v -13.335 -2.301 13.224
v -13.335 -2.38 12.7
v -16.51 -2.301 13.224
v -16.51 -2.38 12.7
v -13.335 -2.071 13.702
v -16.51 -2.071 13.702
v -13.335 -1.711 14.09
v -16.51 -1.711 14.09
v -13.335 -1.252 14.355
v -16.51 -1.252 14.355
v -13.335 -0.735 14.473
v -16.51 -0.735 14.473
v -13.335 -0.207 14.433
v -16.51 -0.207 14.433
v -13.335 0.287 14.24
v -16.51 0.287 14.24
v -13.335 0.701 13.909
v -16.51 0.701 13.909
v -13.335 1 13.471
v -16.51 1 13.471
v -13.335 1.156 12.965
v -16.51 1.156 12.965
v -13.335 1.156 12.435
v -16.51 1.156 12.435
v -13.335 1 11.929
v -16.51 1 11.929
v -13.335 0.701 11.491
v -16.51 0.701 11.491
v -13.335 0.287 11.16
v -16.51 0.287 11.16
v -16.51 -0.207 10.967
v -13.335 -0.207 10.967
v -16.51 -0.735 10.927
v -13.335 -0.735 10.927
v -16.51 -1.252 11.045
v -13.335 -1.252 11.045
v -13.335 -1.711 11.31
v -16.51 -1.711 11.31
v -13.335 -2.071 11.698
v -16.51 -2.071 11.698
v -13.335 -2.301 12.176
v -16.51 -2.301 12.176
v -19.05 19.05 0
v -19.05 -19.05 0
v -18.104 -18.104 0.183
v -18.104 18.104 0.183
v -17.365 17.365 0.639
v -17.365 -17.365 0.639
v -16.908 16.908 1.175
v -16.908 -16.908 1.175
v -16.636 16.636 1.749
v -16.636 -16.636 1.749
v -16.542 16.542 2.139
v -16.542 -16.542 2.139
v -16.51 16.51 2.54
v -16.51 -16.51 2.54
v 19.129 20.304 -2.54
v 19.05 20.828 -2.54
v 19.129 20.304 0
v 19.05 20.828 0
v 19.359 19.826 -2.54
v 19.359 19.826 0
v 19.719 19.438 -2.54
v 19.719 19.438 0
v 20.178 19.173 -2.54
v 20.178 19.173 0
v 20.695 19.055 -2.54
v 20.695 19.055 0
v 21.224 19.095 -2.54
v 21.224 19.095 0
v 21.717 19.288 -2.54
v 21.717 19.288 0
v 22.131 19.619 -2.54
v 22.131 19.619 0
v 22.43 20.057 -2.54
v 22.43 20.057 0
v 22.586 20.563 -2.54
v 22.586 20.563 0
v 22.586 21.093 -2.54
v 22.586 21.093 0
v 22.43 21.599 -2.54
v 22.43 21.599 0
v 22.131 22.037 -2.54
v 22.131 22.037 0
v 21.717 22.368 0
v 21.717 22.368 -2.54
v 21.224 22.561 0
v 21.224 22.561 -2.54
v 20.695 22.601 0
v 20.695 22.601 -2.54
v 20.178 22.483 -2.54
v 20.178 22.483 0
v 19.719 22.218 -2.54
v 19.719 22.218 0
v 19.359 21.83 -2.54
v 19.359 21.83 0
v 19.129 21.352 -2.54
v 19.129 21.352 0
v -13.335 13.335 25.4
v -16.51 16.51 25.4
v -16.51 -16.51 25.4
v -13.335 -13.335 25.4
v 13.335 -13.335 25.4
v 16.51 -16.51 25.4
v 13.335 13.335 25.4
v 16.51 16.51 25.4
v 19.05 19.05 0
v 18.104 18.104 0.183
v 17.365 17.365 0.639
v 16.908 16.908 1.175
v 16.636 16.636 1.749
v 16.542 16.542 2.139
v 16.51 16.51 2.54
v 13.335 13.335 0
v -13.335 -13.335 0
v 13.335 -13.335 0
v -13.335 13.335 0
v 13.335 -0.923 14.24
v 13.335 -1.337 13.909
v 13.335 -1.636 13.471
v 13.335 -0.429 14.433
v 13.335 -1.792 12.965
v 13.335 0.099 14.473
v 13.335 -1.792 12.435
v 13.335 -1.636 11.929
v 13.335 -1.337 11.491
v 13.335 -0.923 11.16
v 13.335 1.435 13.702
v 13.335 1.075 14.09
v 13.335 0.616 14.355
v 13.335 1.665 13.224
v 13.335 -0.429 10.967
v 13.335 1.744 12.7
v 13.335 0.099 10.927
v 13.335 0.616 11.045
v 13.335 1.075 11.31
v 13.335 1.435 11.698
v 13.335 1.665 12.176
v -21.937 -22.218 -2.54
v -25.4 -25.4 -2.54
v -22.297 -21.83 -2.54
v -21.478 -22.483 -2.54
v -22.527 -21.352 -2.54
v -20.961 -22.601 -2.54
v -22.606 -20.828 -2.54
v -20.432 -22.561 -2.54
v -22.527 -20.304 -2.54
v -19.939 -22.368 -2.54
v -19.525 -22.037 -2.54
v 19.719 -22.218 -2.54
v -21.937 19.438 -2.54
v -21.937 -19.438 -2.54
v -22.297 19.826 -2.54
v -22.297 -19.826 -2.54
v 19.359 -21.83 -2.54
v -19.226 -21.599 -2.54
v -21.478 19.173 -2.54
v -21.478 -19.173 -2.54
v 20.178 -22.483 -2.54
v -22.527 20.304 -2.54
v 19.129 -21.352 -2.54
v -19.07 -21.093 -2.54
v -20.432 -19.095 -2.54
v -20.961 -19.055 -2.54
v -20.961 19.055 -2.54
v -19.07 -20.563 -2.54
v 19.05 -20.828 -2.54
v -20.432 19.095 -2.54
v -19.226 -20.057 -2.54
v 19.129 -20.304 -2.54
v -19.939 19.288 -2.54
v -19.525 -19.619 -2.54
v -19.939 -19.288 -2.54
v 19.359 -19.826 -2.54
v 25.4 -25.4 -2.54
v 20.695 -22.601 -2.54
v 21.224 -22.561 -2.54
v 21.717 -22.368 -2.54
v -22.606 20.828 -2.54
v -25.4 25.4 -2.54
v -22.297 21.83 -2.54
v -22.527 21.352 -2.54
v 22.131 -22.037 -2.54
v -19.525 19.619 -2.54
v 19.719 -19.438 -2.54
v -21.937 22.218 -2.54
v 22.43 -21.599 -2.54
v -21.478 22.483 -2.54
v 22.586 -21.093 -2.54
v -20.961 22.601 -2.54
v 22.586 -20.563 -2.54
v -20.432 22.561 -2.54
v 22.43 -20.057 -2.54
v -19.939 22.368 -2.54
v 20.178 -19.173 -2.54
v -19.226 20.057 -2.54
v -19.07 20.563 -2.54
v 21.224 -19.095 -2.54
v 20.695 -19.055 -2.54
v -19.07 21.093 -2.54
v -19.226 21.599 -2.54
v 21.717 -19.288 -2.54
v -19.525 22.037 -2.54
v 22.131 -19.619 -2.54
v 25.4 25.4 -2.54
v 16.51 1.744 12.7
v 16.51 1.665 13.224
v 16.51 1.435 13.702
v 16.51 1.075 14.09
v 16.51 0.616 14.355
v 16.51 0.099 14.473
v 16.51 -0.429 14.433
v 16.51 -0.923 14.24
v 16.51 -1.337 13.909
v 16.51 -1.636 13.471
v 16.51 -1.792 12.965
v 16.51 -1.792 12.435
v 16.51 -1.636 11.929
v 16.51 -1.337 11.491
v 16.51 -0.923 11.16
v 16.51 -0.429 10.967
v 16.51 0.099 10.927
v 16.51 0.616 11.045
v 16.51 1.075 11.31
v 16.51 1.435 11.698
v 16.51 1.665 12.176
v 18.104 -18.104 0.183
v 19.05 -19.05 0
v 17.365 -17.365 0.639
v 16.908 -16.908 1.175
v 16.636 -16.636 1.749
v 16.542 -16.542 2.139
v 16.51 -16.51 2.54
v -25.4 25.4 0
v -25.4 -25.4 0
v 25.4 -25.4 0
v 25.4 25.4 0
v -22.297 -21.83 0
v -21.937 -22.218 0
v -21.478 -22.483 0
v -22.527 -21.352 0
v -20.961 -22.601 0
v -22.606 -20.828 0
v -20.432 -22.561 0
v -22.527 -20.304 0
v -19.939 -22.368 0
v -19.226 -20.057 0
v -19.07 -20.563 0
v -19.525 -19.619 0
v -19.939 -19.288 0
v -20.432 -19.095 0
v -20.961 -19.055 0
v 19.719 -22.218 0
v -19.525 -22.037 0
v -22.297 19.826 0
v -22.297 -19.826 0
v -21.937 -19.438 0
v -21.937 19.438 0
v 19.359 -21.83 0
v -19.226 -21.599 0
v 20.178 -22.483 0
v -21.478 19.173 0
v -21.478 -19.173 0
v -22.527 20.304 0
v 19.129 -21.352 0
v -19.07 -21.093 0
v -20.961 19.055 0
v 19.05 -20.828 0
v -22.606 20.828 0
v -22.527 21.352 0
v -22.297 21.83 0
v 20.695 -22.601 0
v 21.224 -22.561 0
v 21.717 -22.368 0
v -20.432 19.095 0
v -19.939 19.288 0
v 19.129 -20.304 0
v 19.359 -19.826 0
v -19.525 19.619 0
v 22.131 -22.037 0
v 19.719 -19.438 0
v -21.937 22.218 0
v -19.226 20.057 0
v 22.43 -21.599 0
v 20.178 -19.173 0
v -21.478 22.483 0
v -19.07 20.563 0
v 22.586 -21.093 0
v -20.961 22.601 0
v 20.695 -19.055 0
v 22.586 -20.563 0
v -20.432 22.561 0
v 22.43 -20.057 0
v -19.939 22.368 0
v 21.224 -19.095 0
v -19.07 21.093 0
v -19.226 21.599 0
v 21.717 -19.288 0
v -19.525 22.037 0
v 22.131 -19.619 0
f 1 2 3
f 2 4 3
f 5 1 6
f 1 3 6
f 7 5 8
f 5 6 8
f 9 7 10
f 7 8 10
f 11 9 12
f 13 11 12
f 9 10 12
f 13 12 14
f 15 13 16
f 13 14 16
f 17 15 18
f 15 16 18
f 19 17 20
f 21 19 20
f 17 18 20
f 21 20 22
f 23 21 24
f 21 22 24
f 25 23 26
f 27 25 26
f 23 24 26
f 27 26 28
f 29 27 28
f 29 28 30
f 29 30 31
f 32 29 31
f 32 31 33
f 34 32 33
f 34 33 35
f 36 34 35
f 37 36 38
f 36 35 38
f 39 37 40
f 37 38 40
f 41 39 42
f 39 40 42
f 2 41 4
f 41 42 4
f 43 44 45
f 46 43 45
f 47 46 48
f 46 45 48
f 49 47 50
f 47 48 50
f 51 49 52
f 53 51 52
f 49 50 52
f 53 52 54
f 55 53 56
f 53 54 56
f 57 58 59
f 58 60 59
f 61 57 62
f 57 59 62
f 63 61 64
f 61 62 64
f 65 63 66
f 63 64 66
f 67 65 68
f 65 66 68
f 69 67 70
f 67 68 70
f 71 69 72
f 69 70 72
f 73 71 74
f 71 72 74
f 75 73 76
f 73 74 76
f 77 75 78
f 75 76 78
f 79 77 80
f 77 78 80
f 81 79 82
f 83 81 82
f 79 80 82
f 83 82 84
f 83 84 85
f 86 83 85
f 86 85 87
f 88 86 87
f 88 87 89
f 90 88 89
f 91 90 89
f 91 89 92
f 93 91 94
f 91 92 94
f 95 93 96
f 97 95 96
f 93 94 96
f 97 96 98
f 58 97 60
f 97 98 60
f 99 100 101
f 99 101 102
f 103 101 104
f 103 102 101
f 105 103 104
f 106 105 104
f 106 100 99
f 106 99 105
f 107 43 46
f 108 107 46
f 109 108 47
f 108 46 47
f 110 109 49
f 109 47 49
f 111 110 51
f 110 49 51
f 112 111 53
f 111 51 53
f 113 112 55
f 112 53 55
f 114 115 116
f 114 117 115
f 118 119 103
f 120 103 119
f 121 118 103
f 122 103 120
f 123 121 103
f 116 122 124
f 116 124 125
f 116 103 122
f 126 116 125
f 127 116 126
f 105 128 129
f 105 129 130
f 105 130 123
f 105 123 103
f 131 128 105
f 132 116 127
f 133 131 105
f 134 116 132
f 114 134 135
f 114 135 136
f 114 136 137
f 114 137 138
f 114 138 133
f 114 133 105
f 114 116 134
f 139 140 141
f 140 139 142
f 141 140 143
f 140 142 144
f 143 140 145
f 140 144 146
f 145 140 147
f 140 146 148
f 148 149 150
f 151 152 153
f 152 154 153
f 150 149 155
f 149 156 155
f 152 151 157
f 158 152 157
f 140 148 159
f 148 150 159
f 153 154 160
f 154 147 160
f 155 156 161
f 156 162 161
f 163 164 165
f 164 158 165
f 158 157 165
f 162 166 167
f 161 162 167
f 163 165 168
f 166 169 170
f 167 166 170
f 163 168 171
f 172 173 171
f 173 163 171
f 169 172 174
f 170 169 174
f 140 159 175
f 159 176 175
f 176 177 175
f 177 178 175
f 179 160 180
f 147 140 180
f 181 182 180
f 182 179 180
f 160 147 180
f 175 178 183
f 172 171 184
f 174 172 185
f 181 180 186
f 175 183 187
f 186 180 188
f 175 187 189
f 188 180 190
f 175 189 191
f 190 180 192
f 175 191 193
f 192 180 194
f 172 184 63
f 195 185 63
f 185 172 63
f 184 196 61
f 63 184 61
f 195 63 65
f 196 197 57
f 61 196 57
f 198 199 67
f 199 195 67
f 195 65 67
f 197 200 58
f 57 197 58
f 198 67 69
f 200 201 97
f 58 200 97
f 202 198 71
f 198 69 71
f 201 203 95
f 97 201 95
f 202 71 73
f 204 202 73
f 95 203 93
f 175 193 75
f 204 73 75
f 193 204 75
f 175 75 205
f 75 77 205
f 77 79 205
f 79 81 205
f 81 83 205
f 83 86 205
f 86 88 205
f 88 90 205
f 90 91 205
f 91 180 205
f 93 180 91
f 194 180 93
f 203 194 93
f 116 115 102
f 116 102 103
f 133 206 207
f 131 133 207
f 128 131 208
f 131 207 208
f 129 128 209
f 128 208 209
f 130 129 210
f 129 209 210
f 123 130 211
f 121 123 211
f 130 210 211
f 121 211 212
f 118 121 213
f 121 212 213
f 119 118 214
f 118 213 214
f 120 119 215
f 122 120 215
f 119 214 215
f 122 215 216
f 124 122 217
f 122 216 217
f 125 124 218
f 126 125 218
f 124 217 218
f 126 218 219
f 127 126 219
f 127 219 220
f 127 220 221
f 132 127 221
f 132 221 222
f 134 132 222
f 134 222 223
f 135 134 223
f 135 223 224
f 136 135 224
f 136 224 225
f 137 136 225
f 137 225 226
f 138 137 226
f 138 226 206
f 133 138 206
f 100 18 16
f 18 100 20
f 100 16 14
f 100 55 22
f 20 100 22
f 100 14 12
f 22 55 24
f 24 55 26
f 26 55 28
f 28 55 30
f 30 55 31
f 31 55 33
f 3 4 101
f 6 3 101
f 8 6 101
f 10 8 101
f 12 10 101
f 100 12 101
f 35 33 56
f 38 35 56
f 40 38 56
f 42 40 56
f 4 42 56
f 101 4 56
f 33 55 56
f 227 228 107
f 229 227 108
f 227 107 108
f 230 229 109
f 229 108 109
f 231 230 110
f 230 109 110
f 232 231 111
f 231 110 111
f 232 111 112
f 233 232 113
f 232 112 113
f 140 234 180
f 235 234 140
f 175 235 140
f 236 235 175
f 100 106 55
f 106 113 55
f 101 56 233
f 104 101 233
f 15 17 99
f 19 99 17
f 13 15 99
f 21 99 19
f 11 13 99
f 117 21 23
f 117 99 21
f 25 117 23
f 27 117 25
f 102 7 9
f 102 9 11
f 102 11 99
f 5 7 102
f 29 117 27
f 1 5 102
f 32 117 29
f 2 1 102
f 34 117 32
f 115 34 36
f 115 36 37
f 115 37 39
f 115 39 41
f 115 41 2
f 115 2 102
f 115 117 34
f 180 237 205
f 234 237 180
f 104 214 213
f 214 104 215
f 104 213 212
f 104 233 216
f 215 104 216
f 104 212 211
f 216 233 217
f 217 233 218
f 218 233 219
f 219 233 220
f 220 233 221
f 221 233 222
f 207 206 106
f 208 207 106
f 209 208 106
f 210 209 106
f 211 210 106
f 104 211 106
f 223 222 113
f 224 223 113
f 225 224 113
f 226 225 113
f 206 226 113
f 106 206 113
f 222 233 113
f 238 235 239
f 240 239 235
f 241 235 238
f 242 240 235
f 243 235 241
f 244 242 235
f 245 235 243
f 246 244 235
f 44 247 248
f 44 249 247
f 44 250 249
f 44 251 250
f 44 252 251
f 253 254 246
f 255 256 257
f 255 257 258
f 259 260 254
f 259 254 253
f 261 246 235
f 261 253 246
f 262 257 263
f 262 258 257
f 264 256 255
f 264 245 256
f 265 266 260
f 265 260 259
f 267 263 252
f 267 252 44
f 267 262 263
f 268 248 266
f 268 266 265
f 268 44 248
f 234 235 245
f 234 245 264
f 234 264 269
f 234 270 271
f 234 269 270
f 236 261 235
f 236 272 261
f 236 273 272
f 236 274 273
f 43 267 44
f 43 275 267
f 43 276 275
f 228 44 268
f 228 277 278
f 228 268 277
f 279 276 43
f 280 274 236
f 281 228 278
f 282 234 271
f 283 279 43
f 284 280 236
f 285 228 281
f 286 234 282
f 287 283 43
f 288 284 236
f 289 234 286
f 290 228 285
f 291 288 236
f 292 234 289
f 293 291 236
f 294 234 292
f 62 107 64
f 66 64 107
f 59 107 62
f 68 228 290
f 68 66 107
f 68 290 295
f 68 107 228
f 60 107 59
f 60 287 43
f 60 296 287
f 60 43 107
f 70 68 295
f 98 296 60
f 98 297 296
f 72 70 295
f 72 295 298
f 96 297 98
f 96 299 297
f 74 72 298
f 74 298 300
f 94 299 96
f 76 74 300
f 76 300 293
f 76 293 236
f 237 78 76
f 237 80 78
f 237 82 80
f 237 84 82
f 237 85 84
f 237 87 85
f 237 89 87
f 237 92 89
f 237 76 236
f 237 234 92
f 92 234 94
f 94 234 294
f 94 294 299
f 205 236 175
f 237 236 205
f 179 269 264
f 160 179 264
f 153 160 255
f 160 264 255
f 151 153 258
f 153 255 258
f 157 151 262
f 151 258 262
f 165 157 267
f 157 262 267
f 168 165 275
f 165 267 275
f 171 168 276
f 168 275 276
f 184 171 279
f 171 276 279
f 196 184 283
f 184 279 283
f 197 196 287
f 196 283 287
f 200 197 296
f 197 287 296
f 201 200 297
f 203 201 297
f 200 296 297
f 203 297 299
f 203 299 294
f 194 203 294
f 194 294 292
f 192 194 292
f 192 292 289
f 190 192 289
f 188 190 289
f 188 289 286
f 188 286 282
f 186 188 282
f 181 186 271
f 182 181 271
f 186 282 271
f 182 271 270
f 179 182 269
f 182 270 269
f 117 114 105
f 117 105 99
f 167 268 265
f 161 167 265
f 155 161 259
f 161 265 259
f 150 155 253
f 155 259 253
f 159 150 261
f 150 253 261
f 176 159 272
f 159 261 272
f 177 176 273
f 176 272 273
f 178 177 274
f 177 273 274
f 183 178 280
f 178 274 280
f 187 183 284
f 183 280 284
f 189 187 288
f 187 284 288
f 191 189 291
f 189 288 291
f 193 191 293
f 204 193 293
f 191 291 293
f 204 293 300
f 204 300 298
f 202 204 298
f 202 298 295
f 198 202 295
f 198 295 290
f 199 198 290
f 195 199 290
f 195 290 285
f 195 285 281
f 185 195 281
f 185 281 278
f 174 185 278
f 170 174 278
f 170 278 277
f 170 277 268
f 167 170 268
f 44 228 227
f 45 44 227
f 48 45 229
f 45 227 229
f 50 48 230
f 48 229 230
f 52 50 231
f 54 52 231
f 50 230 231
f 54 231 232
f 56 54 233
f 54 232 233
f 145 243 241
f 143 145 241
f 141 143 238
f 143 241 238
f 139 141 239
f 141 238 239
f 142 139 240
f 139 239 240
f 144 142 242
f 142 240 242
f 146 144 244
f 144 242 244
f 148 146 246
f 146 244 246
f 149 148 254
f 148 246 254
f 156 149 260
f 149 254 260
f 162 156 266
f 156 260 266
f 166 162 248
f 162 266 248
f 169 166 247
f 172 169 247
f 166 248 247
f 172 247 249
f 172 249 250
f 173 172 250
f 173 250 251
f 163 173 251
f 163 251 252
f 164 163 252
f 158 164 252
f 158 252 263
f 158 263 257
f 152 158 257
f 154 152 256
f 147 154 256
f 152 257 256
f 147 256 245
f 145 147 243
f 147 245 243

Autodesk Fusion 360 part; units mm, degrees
sketch "Sketch1" plane through (0, 0, 0) normal (0, 0, 1) x (1, 0, 0)
  line L0 (13.335, 13.335) -> (-13.335, 13.335)
  line L1 (-13.335, 13.335) -> (-13.335, -13.335)
  line L2 (-13.335, -13.335) -> (13.335, -13.335)
  line L3 (13.335, -13.335) -> (13.335, 13.335)
  line L4 (13.335, 13.335) -> (-13.335, -13.335) construction
  line L5 (-13.335, 13.335) -> (13.335, -13.335) construction
  line L6 (16.51, 16.51) -> (-16.51, 16.51)
  line L7 (-16.51, 16.51) -> (-16.51, -16.51)
  line L8 (-16.51, -16.51) -> (16.51, -16.51)
  line L9 (16.51, -16.51) -> (16.51, 16.51)
  line L10 (16.51, 16.51) -> (-16.51, -16.51) construction
  line L11 (-16.51, 16.51) -> (16.51, -16.51) construction
  dimension "d1" = 26.67
  dimension "d2" = 26.67
  dimension "d3" = 33.02
  dimension "d4" = 33.02
extrude "Extrude1" add sketch "Sketch1" along normal blind 25.4
sketch "Sketch2" plane through (0, 0, 0) normal (0, 0, 1) x (1, 0, 0)
  line L0 (25.4, 25.4) -> (-25.4, 25.4)
  line L1 (-25.4, 25.4) -> (-25.4, -25.4)
  line L2 (-25.4, -25.4) -> (25.4, -25.4)
  line L3 (25.4, -25.4) -> (25.4, 25.4)
  line L4 (25.4, 25.4) -> (-25.4, -25.4) construction
  line L5 (-25.4, 25.4) -> (25.4, -25.4) construction
  dimension "d7" = 50.8
  dimension "d8" = 50.8
extrude "Extrude2" add sketch "Sketch2" against normal blind 2.54
fillet "Fillet1" radius 2.54 4 edges at (16.51, 0, 0) (0, -16.51, 0) (-16.51, 0, 0) (0, 16.51, 0)
sketch "Sketch4" plane through (0, 0, 0) normal (0, 0, 1) x (-1, 0, 0)
  line L0 (-25.4, 25.4) -> (-25.4, -25.4)
  line L1 (-25.4, -25.4) -> (25.4, -25.4)
  line L2 (25.4, -25.4) -> (25.4, 25.4)
  line L3 (25.4, 25.4) -> (-25.4, 25.4)
  line L4 (-19.05, -19.05) -> (-19.05, 19.05)
  line L5 (-19.05, 19.05) -> (19.05, 19.05)
  line L6 (19.05, 19.05) -> (19.05, -19.05)
  line L7 (19.05, -19.05) -> (-19.05, -19.05)
  circle A0 centre (20.828, -20.828) radius 1.778
  circle A1 centre (-20.828, -20.828) radius 1.778
  circle A2 centre (20.828, 20.828) radius 1.778
  circle A3 centre (-20.828, 20.828) radius 1.778
  dimension "d14" = 3.556
  dimension "d15" = 3.556
  dimension "d16" = 3.556
  dimension "d17" = 3.556
  dimension "d18" = 4.572
  dimension "d19" = 4.572
  dimension "d20" = 4.572
  dimension "d21" = 4.572
  dimension "d22" = 4.572
  dimension "d23" = 4.572
  dimension "d25" = 4.572
  dimension "d41" = 4.572
extrude "Extrude3" cut sketch "Sketch4" against normal blind 2.54 contours A0 | A1 | A2 | A3
sketch "Sketch5" plane through (-16.51, 0, 0) normal (-1, 0, 0) x (0, -1, 0)
  line L0 (-16.51, 2.54) -> (16.51, 2.54)
  line L1 (16.51, 2.54) -> (16.51, 25.4)
  line L2 (16.51, 25.4) -> (-16.51, 25.4)
  line L3 (-16.51, 25.4) -> (-16.51, 2.54)
  circle A0 centre (0.6022, 12.7) radius 1.778
  dimension "d28" = 3.556
  dimension "d29" = 12.7
  dimension "d30" = 15.9078
extrude "Extrude4" cut sketch "Sketch5" against normal blind 5.08 contours A0
sketch "Sketch7" plane through (16.51, 0, 0) normal (1, 0, 0) x (0, 1, 0)
  line L0 (-16.51, 2.54) -> (16.51, 2.54)
  line L1 (16.51, 2.54) -> (16.51, 25.4)
  line L2 (16.51, 25.4) -> (-16.51, 25.4)
  line L3 (-16.51, 25.4) -> (-16.51, 2.54)
  circle A0 centre (-0.0337, 12.7) radius 1.778
  dimension "d37" = 3.556
  dimension "d38" = 12.7
extrude "Extrude6" cut sketch "Sketch7" against normal blind 5.08 contours A0
